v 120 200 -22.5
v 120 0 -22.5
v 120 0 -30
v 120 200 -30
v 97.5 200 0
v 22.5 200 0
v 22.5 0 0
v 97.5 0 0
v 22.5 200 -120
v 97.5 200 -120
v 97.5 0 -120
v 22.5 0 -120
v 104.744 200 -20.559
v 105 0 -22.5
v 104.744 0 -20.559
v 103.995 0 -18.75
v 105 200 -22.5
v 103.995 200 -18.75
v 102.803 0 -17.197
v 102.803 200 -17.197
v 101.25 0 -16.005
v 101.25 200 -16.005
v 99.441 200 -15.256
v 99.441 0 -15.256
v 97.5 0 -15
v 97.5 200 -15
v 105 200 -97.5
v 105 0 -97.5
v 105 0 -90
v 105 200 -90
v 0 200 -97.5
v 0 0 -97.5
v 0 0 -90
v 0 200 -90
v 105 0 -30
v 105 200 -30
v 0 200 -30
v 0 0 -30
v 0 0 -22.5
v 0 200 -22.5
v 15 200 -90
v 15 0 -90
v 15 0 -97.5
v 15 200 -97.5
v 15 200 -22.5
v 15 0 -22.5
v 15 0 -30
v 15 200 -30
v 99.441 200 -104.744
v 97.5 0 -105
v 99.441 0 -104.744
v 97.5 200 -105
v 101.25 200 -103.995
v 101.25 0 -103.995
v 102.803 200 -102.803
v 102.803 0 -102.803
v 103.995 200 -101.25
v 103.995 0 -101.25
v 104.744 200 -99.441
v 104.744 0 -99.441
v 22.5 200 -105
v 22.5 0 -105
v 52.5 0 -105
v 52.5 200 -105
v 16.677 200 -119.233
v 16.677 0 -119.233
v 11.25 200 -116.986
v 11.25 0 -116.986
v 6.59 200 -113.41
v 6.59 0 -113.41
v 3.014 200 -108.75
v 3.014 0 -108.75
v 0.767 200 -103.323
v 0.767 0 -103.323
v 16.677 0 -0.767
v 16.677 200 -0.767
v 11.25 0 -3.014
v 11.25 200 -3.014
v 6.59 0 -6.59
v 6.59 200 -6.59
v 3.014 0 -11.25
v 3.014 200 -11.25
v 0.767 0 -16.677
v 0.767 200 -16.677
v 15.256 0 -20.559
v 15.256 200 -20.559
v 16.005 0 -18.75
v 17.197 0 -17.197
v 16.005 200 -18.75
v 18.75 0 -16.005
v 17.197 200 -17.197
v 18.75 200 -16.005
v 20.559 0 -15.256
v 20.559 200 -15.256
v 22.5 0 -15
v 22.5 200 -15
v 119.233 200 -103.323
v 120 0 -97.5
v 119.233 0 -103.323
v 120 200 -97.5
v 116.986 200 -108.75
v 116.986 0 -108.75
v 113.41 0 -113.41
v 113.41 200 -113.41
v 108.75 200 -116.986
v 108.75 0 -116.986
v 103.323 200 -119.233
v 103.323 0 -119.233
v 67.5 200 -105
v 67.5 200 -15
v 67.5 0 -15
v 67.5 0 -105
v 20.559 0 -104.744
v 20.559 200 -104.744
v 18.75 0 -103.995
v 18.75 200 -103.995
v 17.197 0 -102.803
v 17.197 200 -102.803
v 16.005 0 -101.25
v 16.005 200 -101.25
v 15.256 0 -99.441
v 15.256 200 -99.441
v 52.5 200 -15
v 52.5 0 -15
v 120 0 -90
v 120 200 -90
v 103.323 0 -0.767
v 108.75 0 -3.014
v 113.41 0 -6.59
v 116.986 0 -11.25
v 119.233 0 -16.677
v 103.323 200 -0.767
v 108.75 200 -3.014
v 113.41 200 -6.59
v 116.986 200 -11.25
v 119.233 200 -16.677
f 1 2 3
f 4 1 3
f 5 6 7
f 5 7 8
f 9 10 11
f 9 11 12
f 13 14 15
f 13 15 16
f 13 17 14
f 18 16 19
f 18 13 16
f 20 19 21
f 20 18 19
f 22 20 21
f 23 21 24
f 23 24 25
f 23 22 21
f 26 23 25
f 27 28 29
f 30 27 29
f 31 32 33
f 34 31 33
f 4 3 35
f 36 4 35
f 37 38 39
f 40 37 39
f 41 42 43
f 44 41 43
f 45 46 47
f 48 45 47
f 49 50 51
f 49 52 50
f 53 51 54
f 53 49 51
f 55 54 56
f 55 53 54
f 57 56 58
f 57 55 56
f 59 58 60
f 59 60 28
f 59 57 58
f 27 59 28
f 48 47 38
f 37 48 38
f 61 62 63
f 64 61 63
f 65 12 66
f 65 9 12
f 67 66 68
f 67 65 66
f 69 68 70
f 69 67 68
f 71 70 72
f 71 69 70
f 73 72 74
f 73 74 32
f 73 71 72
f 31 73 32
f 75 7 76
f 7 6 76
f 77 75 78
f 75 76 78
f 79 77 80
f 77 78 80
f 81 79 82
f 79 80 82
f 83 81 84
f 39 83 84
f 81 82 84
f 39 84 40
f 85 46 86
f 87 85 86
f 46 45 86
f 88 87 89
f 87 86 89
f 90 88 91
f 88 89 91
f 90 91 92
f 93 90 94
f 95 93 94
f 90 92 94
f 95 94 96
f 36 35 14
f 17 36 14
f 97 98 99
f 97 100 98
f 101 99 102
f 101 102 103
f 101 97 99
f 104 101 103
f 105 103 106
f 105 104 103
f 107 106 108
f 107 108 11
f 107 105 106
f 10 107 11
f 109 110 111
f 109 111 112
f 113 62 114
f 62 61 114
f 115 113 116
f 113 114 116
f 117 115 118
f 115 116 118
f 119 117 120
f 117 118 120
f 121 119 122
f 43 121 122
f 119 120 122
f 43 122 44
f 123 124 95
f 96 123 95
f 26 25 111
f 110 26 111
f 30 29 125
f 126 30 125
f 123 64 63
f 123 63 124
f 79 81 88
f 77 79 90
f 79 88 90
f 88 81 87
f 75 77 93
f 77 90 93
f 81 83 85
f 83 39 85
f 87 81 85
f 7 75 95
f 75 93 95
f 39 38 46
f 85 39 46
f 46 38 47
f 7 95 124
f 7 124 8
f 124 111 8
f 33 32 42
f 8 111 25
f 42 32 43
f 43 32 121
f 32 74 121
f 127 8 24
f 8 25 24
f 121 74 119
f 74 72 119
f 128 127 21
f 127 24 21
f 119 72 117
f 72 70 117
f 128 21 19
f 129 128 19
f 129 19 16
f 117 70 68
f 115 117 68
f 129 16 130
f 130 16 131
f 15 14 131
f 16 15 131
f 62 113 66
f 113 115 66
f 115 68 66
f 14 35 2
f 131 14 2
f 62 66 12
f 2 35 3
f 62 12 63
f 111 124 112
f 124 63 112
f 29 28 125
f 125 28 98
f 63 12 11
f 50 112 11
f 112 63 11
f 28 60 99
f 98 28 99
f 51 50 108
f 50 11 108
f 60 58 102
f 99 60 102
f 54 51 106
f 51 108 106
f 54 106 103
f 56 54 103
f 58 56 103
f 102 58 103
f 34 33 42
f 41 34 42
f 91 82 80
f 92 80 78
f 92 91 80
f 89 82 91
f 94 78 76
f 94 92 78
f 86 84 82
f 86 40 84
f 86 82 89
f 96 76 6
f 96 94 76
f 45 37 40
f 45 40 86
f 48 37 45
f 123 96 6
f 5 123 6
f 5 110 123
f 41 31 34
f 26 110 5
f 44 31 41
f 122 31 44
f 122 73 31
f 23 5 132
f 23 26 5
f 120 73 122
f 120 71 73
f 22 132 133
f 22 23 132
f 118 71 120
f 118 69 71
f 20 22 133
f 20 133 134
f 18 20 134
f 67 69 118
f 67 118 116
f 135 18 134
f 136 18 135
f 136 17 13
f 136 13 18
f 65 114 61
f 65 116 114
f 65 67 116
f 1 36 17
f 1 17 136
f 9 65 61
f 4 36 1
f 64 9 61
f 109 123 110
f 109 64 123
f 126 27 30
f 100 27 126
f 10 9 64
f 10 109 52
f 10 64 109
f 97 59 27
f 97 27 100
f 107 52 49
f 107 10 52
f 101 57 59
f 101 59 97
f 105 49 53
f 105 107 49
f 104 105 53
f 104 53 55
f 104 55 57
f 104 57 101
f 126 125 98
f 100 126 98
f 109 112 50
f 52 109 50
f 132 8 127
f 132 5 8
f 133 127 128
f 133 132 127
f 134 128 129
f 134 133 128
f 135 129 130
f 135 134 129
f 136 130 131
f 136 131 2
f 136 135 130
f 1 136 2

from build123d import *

# Parameters (mm, degrees)
EXTRUDE_1_DEPTH = 200
FILLET_1_R      = 22.5
FILLET_2_R      = 7.5


with BuildPart() as part:
    # ｽｹｯﾁ5 → ﾎﾞｽ - 押し出し1 (new body)
    with BuildSketch(Plane(origin=(0, 0, 0), x_dir=(1, 0, 0), z_dir=(0, 1, 0))):
        Polygon((0, 0), (120, 0), (120, 30), (105, 30), (105, 15), (67.5, 15), (67.5, 105), (105, 105), (105, 90), (120, 90), (120, 120), (0, 120), (0, 90), (15, 90), (15, 105), (52.5, 105), (52.5, 15), (15, 15), (15, 30), (0, 30), align=None)
    extrude(amount=EXTRUDE_1_DEPTH)

    # ﾌｨﾚｯﾄ1
    fillet_1_edges = [part.edges().sort_by_distance(p)[0] for p in [
        (0, 100, -120),
        (120, 100, -120),
        (120, 100, 0),
        (0, 100, 0),
    ]]
    fillet(fillet_1_edges, radius=FILLET_1_R)

    # ﾌｨﾚｯﾄ2
    fillet_2_edges = [part.edges().sort_by_distance(p)[0] for p in [
        (15, 100, -15),
        (15, 100, -105),
        (105, 100, -105),
        (105, 100, -15),
    ]]
    fillet(fillet_2_edges, radius=FILLET_2_R)


solid = part.part
